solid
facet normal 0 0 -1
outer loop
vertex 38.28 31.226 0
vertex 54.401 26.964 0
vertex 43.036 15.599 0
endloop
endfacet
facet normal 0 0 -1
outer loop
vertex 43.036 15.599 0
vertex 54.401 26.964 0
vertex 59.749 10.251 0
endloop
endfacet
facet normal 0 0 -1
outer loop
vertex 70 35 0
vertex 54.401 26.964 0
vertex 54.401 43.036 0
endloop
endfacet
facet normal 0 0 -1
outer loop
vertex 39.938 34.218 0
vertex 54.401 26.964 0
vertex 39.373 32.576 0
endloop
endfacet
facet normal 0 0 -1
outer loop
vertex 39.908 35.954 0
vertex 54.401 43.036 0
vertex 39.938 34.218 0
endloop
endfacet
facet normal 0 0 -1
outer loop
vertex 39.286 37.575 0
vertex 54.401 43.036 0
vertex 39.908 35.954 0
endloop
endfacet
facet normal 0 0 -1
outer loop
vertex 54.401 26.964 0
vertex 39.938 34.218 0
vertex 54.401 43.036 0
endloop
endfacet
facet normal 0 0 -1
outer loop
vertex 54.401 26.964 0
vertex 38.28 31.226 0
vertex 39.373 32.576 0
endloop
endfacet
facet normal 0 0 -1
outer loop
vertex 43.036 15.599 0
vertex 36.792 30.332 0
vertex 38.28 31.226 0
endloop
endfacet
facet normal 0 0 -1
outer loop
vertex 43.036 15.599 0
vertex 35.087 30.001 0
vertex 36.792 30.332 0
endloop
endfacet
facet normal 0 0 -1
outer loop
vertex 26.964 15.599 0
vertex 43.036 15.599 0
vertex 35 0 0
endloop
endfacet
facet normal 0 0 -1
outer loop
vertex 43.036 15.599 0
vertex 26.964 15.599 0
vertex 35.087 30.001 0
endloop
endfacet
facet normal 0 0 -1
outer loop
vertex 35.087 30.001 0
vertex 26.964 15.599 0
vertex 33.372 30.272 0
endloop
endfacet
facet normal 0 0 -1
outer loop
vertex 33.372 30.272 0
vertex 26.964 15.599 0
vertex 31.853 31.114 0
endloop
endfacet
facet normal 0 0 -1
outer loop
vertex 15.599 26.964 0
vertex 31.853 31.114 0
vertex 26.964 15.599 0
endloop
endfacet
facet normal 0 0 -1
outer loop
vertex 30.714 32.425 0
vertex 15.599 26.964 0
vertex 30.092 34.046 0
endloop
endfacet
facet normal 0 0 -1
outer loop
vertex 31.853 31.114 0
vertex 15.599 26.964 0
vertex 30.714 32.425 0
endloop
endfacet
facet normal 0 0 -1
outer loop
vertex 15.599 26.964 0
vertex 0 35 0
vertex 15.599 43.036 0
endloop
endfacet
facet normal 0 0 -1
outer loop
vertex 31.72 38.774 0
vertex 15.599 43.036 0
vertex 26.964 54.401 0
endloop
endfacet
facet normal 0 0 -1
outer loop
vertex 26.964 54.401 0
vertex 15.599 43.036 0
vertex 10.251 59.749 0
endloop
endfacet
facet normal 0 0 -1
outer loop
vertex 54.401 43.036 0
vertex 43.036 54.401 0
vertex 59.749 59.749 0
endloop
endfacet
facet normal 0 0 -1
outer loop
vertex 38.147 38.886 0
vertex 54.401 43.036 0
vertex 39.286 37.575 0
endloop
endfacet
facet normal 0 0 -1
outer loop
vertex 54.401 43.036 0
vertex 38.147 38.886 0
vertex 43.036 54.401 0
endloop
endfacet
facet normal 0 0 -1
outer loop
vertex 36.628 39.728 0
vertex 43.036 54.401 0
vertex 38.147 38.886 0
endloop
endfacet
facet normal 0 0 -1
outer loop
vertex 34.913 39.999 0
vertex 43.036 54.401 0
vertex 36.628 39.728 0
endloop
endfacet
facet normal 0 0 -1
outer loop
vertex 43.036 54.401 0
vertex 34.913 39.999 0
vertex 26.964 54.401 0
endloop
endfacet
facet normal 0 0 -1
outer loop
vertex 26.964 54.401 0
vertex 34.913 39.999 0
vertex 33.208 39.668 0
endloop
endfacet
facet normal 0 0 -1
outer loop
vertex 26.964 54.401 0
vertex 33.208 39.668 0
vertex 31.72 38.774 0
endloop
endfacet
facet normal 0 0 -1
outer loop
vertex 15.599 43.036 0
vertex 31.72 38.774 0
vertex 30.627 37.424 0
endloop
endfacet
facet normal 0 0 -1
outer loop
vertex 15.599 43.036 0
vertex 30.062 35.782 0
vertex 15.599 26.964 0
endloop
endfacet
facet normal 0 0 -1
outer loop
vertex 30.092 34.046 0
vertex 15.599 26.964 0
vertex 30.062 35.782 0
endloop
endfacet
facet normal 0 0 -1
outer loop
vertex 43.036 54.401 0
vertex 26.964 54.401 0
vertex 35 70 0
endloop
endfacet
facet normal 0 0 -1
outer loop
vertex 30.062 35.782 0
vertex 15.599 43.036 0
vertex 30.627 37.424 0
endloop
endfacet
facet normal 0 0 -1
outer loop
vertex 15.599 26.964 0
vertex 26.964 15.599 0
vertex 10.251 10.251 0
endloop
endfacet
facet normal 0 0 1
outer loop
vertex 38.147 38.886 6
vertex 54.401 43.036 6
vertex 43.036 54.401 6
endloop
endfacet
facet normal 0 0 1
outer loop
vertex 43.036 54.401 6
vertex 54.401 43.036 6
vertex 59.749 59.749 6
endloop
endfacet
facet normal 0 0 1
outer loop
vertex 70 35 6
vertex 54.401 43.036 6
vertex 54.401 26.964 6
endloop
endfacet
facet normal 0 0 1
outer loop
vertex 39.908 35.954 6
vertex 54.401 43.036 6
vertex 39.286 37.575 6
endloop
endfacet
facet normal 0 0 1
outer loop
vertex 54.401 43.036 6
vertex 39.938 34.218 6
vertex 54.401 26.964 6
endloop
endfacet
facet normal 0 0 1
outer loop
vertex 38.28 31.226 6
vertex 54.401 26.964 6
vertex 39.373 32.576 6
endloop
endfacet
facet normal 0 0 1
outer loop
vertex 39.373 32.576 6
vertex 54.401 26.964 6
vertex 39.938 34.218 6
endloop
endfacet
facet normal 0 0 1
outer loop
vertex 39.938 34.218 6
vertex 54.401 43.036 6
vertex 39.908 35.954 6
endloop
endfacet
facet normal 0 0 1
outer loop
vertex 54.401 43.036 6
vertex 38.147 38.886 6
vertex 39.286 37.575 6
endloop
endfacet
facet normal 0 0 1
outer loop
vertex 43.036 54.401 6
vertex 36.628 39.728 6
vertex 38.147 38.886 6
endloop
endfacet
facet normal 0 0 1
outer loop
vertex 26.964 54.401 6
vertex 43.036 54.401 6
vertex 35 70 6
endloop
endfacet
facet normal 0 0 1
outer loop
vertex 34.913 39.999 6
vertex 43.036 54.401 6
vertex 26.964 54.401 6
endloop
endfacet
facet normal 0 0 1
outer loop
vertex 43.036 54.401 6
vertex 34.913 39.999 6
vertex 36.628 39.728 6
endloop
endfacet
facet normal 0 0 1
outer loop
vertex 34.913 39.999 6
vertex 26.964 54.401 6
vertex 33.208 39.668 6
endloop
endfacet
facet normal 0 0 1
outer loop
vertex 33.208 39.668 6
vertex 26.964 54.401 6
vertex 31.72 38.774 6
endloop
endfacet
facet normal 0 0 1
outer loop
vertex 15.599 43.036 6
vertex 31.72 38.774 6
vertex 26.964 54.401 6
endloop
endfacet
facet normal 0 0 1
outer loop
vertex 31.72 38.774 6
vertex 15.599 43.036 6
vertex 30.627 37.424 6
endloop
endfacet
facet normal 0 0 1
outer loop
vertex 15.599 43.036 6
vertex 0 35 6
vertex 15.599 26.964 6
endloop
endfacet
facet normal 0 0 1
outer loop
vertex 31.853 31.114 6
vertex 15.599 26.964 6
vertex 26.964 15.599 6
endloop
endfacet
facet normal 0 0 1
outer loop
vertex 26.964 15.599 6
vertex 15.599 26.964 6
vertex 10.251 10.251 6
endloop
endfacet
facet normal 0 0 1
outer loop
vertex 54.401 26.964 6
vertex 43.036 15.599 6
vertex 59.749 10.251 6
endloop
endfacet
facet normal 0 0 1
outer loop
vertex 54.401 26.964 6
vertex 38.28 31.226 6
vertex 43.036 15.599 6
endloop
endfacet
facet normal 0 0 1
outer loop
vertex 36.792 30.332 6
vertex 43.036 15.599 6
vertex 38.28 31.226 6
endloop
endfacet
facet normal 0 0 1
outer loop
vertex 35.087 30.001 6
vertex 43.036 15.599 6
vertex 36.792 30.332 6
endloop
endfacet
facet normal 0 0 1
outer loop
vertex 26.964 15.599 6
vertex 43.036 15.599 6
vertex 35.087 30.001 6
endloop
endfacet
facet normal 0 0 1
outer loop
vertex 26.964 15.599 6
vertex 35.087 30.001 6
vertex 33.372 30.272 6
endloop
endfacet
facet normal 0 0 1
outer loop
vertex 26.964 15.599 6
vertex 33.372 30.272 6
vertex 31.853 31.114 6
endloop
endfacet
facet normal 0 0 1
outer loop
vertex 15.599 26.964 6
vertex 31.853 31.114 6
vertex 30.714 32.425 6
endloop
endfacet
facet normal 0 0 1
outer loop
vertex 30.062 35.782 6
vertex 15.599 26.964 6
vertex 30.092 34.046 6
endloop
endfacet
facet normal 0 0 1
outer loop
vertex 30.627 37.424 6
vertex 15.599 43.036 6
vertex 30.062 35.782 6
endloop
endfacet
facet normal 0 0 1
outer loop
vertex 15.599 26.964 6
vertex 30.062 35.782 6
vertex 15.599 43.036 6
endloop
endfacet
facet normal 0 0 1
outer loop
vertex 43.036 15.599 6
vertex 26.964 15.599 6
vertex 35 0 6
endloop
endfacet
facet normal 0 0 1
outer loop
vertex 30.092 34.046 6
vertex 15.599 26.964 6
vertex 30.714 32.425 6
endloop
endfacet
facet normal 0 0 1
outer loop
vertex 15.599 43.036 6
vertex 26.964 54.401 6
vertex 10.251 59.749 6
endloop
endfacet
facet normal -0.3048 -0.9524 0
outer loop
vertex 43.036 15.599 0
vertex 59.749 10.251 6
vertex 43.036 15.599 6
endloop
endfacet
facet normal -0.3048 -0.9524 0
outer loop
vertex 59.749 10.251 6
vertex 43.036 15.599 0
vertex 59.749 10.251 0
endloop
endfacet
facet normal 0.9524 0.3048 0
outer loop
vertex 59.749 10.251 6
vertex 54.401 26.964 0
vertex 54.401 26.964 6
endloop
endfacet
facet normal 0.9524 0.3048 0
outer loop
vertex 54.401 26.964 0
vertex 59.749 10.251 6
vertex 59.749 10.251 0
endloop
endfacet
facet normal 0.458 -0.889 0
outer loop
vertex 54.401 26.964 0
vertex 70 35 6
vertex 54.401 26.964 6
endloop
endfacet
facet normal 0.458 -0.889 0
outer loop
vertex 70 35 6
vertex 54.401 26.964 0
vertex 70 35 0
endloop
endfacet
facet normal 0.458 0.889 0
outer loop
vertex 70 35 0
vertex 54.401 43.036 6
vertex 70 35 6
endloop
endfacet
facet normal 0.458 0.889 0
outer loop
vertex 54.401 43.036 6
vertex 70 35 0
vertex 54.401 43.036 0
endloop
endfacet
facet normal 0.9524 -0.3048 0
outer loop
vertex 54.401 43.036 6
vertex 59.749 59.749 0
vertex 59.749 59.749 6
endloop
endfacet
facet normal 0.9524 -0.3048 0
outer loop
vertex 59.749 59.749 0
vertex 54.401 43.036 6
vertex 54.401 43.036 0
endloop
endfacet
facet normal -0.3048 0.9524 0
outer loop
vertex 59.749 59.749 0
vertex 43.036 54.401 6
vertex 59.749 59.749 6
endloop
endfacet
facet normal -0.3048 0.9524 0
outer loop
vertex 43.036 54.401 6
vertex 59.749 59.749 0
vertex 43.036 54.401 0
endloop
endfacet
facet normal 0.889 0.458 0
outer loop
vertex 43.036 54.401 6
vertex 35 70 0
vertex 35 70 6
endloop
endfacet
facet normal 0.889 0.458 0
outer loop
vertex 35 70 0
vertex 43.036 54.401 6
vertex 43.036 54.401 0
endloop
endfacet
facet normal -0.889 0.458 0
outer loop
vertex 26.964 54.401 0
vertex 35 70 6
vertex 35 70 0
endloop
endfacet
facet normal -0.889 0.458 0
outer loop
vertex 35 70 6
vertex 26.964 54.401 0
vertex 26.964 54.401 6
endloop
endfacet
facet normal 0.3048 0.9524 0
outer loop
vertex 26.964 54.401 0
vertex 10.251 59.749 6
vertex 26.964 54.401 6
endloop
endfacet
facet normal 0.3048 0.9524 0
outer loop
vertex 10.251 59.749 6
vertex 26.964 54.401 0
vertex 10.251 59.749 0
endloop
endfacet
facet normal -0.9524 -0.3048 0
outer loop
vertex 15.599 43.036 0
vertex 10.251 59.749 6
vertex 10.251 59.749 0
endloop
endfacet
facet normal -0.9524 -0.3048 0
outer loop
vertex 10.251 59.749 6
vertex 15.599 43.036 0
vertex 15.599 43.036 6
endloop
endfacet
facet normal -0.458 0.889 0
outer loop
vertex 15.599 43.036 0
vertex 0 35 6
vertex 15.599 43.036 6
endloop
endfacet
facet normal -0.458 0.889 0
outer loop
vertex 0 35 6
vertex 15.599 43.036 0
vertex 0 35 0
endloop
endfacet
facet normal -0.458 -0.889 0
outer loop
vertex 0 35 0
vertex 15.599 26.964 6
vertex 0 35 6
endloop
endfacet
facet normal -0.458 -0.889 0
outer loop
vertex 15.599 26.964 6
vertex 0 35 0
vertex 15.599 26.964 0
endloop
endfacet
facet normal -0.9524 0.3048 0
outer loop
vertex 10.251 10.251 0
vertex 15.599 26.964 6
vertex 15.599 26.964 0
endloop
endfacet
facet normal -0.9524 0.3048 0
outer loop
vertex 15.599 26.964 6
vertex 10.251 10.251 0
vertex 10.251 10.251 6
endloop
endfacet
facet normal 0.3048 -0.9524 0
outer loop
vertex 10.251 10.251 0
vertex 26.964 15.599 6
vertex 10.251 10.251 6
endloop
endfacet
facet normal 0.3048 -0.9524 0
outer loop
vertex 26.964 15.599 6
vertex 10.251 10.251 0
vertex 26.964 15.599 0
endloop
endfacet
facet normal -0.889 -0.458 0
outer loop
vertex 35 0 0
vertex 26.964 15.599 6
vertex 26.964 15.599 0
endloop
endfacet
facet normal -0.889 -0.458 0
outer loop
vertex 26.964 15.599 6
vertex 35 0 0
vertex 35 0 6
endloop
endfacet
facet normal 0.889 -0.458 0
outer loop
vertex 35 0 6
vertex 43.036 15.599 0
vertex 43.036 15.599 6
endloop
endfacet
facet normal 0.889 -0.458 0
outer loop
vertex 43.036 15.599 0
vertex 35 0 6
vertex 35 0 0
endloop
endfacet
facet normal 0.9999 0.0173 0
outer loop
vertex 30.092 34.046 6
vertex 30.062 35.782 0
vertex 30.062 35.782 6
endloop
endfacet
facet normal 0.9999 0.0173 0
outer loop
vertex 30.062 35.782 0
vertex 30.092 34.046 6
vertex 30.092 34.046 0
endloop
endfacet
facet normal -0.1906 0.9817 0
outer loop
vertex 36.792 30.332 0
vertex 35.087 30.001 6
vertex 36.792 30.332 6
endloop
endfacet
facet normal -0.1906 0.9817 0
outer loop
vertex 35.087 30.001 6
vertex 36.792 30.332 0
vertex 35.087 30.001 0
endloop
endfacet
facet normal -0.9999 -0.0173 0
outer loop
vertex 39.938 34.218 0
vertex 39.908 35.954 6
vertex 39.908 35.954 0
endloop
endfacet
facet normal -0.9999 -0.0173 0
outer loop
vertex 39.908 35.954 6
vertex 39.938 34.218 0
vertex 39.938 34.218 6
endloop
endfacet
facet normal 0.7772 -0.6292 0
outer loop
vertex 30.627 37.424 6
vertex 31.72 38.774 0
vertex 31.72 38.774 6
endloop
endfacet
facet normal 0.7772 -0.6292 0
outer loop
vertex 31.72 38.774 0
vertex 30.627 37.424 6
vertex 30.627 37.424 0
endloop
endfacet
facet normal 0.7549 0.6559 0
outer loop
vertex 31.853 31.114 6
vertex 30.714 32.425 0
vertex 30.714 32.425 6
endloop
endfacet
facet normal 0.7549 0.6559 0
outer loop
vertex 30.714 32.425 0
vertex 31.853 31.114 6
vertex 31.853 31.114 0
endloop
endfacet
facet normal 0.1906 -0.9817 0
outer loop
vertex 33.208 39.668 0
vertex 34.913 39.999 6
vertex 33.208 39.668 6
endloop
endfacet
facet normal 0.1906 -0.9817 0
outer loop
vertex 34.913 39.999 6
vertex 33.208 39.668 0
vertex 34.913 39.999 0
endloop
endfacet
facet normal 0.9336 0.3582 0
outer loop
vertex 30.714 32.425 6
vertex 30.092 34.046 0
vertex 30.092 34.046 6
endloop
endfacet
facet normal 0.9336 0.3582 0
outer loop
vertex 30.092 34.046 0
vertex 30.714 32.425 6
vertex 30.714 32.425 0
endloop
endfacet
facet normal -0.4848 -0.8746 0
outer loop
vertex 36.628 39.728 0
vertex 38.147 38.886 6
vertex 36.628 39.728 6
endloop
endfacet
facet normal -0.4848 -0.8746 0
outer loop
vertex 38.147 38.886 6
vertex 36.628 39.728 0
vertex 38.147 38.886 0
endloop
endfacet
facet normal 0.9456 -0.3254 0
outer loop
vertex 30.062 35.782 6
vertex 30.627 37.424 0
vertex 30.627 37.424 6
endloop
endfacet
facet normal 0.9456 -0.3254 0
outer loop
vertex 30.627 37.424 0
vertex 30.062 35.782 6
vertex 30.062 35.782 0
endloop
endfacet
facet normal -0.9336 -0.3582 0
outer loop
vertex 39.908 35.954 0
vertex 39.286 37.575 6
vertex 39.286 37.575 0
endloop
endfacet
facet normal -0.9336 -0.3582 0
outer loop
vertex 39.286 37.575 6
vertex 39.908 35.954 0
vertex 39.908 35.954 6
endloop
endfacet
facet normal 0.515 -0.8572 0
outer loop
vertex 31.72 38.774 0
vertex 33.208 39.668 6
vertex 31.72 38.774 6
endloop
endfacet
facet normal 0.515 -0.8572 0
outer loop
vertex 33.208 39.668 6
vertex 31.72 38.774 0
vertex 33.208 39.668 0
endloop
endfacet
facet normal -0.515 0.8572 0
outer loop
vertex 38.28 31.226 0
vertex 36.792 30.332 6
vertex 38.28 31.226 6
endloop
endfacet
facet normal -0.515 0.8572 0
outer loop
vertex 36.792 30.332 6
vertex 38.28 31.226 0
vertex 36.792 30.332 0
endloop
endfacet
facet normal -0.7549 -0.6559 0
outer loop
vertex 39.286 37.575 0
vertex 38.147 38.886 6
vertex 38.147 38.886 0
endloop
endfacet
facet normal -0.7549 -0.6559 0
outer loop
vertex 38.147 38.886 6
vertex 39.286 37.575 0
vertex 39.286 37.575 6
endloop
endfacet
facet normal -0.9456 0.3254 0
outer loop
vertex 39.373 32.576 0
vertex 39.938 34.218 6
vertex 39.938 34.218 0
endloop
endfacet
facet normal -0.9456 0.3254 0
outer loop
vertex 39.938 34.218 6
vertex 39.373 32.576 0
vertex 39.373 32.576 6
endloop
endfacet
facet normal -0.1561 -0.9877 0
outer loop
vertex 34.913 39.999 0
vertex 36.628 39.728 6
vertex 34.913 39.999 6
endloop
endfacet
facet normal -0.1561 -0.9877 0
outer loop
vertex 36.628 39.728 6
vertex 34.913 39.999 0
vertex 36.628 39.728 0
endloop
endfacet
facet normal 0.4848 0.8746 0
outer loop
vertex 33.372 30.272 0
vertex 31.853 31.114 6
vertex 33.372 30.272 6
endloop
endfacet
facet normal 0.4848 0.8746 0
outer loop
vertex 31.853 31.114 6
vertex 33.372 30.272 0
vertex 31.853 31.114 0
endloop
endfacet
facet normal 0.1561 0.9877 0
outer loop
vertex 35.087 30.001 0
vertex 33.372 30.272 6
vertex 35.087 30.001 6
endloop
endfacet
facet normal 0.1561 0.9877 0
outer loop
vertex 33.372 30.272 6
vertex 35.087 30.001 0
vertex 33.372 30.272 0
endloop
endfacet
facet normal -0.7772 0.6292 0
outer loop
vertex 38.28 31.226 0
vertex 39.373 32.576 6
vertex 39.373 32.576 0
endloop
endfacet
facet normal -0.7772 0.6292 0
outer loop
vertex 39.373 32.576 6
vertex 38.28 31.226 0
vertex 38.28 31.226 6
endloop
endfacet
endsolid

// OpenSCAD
$fn = 32;

// ----------------------------------------------------------------------
// Star wheel: 8-point star, R35
// ----------------------------------------------------------------------

// --- parameters (mm) ---
n_points = 8;             // number of points / teeth
r_out = 35;               // tip radius
r_in = 21;                // root radius
bore_r = 5;               // centre bore radius
plate_t = 6;              // plate thickness, Z (extrusion height)
bore_d = 10;              // centre bore diameter

profile = [[35, 70], [26.964, 54.401], [10.251, 59.749], [15.599, 43.036], [0, 35], [15.599, 26.964], [10.251, 10.251], [26.964, 15.599], [35, 0], [43.036, 15.599], [59.749, 10.251], [54.401, 26.964], [70, 35], [54.401, 43.036], [59.749, 59.749], [43.036, 54.401]];  // primary outline, 16 points, counter clockwise
void_1 = [[39.908, 35.954], [39.286, 37.575], [38.147, 38.886], [36.628, 39.728], [34.913, 39.999], [33.208, 39.668], [31.72, 38.774], [30.627, 37.424], [30.062, 35.782], [30.092, 34.046], [30.714, 32.425], [31.853, 31.114], [33.372, 30.272], [35.087, 30.001], [36.792, 30.332], [38.28, 31.226], [39.373, 32.576], [39.938, 34.218]];  // centre bore, 18 points

// --- the one profile operation ---
difference() {
  linear_extrude(height = plate_t) polygon(points = profile);
  translate([0, 0, -1])
    linear_extrude(height = plate_t + 2) polygon(points = void_1);
}
